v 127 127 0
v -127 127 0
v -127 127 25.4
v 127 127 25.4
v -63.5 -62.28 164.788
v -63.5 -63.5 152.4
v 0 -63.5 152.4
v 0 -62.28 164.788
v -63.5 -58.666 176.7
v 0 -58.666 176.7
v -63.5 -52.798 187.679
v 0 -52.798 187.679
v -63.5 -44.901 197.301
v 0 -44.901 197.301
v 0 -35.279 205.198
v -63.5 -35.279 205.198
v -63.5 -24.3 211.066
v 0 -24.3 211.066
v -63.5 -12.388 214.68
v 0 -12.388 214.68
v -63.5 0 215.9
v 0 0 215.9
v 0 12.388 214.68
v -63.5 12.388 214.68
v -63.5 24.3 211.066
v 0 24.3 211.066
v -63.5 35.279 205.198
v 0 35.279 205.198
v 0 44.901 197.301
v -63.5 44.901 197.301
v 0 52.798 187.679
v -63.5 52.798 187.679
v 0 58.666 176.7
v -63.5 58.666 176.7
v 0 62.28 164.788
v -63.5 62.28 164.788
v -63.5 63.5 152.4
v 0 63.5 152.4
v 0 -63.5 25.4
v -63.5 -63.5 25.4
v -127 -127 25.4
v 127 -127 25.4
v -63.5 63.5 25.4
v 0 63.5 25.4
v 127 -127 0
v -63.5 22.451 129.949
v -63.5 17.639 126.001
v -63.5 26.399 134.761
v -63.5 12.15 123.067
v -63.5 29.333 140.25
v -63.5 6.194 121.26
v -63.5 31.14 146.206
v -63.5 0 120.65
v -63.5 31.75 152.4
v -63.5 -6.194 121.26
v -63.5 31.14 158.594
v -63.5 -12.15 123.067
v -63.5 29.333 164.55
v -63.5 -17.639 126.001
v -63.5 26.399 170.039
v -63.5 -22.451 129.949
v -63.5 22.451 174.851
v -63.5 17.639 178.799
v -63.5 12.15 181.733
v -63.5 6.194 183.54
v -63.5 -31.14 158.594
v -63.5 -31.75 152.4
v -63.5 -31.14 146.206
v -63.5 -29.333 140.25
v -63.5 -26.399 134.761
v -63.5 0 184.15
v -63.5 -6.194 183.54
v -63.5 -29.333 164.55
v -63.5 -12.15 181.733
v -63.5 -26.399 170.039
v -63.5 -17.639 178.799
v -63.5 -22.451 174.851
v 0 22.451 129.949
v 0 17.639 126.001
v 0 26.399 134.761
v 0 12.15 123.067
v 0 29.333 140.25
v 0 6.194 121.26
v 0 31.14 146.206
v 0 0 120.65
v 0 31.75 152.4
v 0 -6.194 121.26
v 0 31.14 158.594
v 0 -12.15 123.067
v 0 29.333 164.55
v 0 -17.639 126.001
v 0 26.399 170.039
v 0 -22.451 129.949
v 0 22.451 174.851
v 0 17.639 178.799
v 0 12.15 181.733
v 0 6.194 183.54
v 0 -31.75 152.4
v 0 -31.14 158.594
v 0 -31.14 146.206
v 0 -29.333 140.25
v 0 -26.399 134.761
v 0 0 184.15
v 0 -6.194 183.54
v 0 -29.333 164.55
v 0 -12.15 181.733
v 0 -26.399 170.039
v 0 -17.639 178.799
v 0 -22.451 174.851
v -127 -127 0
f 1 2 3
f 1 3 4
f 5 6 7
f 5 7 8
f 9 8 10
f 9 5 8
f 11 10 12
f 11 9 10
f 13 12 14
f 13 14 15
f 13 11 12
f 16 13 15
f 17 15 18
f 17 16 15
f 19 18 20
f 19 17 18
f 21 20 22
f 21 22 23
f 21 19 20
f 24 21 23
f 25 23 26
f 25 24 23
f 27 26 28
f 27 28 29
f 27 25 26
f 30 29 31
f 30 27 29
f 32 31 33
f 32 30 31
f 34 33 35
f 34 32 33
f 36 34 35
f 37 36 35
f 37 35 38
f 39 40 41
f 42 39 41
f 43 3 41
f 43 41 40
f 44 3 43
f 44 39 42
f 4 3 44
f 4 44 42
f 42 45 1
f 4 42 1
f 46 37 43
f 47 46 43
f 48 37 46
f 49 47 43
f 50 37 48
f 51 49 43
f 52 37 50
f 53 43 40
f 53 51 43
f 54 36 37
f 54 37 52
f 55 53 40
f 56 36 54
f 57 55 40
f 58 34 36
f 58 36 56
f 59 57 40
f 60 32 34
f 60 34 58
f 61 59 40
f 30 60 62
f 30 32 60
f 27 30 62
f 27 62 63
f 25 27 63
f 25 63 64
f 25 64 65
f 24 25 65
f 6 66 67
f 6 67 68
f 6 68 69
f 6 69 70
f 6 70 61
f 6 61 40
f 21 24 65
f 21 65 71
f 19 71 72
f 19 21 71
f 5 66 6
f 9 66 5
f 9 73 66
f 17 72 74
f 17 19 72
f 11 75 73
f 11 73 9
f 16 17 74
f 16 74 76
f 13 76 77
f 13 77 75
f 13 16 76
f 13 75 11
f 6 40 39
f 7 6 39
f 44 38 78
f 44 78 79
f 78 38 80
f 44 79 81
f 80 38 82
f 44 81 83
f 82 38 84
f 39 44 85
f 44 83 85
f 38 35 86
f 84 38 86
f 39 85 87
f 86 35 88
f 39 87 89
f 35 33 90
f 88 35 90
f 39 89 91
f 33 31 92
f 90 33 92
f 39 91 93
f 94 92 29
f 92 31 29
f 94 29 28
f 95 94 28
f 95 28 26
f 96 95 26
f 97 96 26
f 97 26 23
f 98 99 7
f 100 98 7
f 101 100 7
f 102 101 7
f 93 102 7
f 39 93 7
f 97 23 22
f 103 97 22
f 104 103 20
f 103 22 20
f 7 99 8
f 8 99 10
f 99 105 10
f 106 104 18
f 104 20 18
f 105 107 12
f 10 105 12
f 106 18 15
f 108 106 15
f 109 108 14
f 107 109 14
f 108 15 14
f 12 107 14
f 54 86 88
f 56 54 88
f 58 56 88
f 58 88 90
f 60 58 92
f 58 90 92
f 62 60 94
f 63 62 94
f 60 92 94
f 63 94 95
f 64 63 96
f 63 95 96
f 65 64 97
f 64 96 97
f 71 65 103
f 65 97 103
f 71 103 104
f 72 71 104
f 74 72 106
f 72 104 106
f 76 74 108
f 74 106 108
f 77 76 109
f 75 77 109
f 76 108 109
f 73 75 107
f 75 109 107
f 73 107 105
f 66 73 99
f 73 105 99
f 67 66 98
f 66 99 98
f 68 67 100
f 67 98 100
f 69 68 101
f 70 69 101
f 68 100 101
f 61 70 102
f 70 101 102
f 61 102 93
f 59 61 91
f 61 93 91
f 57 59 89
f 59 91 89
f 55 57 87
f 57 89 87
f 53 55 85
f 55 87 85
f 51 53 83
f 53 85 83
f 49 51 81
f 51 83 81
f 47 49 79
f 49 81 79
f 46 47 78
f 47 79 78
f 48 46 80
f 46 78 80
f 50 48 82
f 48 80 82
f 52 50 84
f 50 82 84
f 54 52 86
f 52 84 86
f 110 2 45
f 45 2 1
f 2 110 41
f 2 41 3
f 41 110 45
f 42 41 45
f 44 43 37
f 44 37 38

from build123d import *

# Parameters (mm, degrees)
F0_W     = 254
F0_H     = 254
F1_DEPTH = 25.4
F2_W     = 63.5
F2_H     = 127
F3_DEPTH = 127
F4_R     = 63.5
F5_DEPTH = 63.5
F6_R     = 31.75
F7_DEPTH = 63.5


with BuildPart() as f1:
    # F0 (on Top) → F1 (new body)
    with BuildSketch(Plane.XY):
        Rectangle(F0_W, F0_H)
    extrude(amount=F1_DEPTH)

    # F2 (on face) → F3 (join)
    with BuildSketch(Plane.XY.offset(25.4)):
        with Locations((-31.75, 0)):
            Rectangle(F2_W, F2_H)
    extrude(amount=F3_DEPTH)

    # F4 (on face) → F5 (join)
    with BuildSketch(Plane(origin=(-63.5, 0, 0), x_dir=(0, -1, 0), z_dir=(-1, 0, 0))):
        with Locations((0, 152.4)):
            Circle(F4_R)
    extrude(amount=-F5_DEPTH)

    # F6 (on face) → F7 (cut, through all)
    with BuildSketch(Plane.YZ):
        with Locations((0, 152.4)):
            Circle(F6_R)
    extrude(amount=-F7_DEPTH, mode=Mode.SUBTRACT)


solid = f1.part
